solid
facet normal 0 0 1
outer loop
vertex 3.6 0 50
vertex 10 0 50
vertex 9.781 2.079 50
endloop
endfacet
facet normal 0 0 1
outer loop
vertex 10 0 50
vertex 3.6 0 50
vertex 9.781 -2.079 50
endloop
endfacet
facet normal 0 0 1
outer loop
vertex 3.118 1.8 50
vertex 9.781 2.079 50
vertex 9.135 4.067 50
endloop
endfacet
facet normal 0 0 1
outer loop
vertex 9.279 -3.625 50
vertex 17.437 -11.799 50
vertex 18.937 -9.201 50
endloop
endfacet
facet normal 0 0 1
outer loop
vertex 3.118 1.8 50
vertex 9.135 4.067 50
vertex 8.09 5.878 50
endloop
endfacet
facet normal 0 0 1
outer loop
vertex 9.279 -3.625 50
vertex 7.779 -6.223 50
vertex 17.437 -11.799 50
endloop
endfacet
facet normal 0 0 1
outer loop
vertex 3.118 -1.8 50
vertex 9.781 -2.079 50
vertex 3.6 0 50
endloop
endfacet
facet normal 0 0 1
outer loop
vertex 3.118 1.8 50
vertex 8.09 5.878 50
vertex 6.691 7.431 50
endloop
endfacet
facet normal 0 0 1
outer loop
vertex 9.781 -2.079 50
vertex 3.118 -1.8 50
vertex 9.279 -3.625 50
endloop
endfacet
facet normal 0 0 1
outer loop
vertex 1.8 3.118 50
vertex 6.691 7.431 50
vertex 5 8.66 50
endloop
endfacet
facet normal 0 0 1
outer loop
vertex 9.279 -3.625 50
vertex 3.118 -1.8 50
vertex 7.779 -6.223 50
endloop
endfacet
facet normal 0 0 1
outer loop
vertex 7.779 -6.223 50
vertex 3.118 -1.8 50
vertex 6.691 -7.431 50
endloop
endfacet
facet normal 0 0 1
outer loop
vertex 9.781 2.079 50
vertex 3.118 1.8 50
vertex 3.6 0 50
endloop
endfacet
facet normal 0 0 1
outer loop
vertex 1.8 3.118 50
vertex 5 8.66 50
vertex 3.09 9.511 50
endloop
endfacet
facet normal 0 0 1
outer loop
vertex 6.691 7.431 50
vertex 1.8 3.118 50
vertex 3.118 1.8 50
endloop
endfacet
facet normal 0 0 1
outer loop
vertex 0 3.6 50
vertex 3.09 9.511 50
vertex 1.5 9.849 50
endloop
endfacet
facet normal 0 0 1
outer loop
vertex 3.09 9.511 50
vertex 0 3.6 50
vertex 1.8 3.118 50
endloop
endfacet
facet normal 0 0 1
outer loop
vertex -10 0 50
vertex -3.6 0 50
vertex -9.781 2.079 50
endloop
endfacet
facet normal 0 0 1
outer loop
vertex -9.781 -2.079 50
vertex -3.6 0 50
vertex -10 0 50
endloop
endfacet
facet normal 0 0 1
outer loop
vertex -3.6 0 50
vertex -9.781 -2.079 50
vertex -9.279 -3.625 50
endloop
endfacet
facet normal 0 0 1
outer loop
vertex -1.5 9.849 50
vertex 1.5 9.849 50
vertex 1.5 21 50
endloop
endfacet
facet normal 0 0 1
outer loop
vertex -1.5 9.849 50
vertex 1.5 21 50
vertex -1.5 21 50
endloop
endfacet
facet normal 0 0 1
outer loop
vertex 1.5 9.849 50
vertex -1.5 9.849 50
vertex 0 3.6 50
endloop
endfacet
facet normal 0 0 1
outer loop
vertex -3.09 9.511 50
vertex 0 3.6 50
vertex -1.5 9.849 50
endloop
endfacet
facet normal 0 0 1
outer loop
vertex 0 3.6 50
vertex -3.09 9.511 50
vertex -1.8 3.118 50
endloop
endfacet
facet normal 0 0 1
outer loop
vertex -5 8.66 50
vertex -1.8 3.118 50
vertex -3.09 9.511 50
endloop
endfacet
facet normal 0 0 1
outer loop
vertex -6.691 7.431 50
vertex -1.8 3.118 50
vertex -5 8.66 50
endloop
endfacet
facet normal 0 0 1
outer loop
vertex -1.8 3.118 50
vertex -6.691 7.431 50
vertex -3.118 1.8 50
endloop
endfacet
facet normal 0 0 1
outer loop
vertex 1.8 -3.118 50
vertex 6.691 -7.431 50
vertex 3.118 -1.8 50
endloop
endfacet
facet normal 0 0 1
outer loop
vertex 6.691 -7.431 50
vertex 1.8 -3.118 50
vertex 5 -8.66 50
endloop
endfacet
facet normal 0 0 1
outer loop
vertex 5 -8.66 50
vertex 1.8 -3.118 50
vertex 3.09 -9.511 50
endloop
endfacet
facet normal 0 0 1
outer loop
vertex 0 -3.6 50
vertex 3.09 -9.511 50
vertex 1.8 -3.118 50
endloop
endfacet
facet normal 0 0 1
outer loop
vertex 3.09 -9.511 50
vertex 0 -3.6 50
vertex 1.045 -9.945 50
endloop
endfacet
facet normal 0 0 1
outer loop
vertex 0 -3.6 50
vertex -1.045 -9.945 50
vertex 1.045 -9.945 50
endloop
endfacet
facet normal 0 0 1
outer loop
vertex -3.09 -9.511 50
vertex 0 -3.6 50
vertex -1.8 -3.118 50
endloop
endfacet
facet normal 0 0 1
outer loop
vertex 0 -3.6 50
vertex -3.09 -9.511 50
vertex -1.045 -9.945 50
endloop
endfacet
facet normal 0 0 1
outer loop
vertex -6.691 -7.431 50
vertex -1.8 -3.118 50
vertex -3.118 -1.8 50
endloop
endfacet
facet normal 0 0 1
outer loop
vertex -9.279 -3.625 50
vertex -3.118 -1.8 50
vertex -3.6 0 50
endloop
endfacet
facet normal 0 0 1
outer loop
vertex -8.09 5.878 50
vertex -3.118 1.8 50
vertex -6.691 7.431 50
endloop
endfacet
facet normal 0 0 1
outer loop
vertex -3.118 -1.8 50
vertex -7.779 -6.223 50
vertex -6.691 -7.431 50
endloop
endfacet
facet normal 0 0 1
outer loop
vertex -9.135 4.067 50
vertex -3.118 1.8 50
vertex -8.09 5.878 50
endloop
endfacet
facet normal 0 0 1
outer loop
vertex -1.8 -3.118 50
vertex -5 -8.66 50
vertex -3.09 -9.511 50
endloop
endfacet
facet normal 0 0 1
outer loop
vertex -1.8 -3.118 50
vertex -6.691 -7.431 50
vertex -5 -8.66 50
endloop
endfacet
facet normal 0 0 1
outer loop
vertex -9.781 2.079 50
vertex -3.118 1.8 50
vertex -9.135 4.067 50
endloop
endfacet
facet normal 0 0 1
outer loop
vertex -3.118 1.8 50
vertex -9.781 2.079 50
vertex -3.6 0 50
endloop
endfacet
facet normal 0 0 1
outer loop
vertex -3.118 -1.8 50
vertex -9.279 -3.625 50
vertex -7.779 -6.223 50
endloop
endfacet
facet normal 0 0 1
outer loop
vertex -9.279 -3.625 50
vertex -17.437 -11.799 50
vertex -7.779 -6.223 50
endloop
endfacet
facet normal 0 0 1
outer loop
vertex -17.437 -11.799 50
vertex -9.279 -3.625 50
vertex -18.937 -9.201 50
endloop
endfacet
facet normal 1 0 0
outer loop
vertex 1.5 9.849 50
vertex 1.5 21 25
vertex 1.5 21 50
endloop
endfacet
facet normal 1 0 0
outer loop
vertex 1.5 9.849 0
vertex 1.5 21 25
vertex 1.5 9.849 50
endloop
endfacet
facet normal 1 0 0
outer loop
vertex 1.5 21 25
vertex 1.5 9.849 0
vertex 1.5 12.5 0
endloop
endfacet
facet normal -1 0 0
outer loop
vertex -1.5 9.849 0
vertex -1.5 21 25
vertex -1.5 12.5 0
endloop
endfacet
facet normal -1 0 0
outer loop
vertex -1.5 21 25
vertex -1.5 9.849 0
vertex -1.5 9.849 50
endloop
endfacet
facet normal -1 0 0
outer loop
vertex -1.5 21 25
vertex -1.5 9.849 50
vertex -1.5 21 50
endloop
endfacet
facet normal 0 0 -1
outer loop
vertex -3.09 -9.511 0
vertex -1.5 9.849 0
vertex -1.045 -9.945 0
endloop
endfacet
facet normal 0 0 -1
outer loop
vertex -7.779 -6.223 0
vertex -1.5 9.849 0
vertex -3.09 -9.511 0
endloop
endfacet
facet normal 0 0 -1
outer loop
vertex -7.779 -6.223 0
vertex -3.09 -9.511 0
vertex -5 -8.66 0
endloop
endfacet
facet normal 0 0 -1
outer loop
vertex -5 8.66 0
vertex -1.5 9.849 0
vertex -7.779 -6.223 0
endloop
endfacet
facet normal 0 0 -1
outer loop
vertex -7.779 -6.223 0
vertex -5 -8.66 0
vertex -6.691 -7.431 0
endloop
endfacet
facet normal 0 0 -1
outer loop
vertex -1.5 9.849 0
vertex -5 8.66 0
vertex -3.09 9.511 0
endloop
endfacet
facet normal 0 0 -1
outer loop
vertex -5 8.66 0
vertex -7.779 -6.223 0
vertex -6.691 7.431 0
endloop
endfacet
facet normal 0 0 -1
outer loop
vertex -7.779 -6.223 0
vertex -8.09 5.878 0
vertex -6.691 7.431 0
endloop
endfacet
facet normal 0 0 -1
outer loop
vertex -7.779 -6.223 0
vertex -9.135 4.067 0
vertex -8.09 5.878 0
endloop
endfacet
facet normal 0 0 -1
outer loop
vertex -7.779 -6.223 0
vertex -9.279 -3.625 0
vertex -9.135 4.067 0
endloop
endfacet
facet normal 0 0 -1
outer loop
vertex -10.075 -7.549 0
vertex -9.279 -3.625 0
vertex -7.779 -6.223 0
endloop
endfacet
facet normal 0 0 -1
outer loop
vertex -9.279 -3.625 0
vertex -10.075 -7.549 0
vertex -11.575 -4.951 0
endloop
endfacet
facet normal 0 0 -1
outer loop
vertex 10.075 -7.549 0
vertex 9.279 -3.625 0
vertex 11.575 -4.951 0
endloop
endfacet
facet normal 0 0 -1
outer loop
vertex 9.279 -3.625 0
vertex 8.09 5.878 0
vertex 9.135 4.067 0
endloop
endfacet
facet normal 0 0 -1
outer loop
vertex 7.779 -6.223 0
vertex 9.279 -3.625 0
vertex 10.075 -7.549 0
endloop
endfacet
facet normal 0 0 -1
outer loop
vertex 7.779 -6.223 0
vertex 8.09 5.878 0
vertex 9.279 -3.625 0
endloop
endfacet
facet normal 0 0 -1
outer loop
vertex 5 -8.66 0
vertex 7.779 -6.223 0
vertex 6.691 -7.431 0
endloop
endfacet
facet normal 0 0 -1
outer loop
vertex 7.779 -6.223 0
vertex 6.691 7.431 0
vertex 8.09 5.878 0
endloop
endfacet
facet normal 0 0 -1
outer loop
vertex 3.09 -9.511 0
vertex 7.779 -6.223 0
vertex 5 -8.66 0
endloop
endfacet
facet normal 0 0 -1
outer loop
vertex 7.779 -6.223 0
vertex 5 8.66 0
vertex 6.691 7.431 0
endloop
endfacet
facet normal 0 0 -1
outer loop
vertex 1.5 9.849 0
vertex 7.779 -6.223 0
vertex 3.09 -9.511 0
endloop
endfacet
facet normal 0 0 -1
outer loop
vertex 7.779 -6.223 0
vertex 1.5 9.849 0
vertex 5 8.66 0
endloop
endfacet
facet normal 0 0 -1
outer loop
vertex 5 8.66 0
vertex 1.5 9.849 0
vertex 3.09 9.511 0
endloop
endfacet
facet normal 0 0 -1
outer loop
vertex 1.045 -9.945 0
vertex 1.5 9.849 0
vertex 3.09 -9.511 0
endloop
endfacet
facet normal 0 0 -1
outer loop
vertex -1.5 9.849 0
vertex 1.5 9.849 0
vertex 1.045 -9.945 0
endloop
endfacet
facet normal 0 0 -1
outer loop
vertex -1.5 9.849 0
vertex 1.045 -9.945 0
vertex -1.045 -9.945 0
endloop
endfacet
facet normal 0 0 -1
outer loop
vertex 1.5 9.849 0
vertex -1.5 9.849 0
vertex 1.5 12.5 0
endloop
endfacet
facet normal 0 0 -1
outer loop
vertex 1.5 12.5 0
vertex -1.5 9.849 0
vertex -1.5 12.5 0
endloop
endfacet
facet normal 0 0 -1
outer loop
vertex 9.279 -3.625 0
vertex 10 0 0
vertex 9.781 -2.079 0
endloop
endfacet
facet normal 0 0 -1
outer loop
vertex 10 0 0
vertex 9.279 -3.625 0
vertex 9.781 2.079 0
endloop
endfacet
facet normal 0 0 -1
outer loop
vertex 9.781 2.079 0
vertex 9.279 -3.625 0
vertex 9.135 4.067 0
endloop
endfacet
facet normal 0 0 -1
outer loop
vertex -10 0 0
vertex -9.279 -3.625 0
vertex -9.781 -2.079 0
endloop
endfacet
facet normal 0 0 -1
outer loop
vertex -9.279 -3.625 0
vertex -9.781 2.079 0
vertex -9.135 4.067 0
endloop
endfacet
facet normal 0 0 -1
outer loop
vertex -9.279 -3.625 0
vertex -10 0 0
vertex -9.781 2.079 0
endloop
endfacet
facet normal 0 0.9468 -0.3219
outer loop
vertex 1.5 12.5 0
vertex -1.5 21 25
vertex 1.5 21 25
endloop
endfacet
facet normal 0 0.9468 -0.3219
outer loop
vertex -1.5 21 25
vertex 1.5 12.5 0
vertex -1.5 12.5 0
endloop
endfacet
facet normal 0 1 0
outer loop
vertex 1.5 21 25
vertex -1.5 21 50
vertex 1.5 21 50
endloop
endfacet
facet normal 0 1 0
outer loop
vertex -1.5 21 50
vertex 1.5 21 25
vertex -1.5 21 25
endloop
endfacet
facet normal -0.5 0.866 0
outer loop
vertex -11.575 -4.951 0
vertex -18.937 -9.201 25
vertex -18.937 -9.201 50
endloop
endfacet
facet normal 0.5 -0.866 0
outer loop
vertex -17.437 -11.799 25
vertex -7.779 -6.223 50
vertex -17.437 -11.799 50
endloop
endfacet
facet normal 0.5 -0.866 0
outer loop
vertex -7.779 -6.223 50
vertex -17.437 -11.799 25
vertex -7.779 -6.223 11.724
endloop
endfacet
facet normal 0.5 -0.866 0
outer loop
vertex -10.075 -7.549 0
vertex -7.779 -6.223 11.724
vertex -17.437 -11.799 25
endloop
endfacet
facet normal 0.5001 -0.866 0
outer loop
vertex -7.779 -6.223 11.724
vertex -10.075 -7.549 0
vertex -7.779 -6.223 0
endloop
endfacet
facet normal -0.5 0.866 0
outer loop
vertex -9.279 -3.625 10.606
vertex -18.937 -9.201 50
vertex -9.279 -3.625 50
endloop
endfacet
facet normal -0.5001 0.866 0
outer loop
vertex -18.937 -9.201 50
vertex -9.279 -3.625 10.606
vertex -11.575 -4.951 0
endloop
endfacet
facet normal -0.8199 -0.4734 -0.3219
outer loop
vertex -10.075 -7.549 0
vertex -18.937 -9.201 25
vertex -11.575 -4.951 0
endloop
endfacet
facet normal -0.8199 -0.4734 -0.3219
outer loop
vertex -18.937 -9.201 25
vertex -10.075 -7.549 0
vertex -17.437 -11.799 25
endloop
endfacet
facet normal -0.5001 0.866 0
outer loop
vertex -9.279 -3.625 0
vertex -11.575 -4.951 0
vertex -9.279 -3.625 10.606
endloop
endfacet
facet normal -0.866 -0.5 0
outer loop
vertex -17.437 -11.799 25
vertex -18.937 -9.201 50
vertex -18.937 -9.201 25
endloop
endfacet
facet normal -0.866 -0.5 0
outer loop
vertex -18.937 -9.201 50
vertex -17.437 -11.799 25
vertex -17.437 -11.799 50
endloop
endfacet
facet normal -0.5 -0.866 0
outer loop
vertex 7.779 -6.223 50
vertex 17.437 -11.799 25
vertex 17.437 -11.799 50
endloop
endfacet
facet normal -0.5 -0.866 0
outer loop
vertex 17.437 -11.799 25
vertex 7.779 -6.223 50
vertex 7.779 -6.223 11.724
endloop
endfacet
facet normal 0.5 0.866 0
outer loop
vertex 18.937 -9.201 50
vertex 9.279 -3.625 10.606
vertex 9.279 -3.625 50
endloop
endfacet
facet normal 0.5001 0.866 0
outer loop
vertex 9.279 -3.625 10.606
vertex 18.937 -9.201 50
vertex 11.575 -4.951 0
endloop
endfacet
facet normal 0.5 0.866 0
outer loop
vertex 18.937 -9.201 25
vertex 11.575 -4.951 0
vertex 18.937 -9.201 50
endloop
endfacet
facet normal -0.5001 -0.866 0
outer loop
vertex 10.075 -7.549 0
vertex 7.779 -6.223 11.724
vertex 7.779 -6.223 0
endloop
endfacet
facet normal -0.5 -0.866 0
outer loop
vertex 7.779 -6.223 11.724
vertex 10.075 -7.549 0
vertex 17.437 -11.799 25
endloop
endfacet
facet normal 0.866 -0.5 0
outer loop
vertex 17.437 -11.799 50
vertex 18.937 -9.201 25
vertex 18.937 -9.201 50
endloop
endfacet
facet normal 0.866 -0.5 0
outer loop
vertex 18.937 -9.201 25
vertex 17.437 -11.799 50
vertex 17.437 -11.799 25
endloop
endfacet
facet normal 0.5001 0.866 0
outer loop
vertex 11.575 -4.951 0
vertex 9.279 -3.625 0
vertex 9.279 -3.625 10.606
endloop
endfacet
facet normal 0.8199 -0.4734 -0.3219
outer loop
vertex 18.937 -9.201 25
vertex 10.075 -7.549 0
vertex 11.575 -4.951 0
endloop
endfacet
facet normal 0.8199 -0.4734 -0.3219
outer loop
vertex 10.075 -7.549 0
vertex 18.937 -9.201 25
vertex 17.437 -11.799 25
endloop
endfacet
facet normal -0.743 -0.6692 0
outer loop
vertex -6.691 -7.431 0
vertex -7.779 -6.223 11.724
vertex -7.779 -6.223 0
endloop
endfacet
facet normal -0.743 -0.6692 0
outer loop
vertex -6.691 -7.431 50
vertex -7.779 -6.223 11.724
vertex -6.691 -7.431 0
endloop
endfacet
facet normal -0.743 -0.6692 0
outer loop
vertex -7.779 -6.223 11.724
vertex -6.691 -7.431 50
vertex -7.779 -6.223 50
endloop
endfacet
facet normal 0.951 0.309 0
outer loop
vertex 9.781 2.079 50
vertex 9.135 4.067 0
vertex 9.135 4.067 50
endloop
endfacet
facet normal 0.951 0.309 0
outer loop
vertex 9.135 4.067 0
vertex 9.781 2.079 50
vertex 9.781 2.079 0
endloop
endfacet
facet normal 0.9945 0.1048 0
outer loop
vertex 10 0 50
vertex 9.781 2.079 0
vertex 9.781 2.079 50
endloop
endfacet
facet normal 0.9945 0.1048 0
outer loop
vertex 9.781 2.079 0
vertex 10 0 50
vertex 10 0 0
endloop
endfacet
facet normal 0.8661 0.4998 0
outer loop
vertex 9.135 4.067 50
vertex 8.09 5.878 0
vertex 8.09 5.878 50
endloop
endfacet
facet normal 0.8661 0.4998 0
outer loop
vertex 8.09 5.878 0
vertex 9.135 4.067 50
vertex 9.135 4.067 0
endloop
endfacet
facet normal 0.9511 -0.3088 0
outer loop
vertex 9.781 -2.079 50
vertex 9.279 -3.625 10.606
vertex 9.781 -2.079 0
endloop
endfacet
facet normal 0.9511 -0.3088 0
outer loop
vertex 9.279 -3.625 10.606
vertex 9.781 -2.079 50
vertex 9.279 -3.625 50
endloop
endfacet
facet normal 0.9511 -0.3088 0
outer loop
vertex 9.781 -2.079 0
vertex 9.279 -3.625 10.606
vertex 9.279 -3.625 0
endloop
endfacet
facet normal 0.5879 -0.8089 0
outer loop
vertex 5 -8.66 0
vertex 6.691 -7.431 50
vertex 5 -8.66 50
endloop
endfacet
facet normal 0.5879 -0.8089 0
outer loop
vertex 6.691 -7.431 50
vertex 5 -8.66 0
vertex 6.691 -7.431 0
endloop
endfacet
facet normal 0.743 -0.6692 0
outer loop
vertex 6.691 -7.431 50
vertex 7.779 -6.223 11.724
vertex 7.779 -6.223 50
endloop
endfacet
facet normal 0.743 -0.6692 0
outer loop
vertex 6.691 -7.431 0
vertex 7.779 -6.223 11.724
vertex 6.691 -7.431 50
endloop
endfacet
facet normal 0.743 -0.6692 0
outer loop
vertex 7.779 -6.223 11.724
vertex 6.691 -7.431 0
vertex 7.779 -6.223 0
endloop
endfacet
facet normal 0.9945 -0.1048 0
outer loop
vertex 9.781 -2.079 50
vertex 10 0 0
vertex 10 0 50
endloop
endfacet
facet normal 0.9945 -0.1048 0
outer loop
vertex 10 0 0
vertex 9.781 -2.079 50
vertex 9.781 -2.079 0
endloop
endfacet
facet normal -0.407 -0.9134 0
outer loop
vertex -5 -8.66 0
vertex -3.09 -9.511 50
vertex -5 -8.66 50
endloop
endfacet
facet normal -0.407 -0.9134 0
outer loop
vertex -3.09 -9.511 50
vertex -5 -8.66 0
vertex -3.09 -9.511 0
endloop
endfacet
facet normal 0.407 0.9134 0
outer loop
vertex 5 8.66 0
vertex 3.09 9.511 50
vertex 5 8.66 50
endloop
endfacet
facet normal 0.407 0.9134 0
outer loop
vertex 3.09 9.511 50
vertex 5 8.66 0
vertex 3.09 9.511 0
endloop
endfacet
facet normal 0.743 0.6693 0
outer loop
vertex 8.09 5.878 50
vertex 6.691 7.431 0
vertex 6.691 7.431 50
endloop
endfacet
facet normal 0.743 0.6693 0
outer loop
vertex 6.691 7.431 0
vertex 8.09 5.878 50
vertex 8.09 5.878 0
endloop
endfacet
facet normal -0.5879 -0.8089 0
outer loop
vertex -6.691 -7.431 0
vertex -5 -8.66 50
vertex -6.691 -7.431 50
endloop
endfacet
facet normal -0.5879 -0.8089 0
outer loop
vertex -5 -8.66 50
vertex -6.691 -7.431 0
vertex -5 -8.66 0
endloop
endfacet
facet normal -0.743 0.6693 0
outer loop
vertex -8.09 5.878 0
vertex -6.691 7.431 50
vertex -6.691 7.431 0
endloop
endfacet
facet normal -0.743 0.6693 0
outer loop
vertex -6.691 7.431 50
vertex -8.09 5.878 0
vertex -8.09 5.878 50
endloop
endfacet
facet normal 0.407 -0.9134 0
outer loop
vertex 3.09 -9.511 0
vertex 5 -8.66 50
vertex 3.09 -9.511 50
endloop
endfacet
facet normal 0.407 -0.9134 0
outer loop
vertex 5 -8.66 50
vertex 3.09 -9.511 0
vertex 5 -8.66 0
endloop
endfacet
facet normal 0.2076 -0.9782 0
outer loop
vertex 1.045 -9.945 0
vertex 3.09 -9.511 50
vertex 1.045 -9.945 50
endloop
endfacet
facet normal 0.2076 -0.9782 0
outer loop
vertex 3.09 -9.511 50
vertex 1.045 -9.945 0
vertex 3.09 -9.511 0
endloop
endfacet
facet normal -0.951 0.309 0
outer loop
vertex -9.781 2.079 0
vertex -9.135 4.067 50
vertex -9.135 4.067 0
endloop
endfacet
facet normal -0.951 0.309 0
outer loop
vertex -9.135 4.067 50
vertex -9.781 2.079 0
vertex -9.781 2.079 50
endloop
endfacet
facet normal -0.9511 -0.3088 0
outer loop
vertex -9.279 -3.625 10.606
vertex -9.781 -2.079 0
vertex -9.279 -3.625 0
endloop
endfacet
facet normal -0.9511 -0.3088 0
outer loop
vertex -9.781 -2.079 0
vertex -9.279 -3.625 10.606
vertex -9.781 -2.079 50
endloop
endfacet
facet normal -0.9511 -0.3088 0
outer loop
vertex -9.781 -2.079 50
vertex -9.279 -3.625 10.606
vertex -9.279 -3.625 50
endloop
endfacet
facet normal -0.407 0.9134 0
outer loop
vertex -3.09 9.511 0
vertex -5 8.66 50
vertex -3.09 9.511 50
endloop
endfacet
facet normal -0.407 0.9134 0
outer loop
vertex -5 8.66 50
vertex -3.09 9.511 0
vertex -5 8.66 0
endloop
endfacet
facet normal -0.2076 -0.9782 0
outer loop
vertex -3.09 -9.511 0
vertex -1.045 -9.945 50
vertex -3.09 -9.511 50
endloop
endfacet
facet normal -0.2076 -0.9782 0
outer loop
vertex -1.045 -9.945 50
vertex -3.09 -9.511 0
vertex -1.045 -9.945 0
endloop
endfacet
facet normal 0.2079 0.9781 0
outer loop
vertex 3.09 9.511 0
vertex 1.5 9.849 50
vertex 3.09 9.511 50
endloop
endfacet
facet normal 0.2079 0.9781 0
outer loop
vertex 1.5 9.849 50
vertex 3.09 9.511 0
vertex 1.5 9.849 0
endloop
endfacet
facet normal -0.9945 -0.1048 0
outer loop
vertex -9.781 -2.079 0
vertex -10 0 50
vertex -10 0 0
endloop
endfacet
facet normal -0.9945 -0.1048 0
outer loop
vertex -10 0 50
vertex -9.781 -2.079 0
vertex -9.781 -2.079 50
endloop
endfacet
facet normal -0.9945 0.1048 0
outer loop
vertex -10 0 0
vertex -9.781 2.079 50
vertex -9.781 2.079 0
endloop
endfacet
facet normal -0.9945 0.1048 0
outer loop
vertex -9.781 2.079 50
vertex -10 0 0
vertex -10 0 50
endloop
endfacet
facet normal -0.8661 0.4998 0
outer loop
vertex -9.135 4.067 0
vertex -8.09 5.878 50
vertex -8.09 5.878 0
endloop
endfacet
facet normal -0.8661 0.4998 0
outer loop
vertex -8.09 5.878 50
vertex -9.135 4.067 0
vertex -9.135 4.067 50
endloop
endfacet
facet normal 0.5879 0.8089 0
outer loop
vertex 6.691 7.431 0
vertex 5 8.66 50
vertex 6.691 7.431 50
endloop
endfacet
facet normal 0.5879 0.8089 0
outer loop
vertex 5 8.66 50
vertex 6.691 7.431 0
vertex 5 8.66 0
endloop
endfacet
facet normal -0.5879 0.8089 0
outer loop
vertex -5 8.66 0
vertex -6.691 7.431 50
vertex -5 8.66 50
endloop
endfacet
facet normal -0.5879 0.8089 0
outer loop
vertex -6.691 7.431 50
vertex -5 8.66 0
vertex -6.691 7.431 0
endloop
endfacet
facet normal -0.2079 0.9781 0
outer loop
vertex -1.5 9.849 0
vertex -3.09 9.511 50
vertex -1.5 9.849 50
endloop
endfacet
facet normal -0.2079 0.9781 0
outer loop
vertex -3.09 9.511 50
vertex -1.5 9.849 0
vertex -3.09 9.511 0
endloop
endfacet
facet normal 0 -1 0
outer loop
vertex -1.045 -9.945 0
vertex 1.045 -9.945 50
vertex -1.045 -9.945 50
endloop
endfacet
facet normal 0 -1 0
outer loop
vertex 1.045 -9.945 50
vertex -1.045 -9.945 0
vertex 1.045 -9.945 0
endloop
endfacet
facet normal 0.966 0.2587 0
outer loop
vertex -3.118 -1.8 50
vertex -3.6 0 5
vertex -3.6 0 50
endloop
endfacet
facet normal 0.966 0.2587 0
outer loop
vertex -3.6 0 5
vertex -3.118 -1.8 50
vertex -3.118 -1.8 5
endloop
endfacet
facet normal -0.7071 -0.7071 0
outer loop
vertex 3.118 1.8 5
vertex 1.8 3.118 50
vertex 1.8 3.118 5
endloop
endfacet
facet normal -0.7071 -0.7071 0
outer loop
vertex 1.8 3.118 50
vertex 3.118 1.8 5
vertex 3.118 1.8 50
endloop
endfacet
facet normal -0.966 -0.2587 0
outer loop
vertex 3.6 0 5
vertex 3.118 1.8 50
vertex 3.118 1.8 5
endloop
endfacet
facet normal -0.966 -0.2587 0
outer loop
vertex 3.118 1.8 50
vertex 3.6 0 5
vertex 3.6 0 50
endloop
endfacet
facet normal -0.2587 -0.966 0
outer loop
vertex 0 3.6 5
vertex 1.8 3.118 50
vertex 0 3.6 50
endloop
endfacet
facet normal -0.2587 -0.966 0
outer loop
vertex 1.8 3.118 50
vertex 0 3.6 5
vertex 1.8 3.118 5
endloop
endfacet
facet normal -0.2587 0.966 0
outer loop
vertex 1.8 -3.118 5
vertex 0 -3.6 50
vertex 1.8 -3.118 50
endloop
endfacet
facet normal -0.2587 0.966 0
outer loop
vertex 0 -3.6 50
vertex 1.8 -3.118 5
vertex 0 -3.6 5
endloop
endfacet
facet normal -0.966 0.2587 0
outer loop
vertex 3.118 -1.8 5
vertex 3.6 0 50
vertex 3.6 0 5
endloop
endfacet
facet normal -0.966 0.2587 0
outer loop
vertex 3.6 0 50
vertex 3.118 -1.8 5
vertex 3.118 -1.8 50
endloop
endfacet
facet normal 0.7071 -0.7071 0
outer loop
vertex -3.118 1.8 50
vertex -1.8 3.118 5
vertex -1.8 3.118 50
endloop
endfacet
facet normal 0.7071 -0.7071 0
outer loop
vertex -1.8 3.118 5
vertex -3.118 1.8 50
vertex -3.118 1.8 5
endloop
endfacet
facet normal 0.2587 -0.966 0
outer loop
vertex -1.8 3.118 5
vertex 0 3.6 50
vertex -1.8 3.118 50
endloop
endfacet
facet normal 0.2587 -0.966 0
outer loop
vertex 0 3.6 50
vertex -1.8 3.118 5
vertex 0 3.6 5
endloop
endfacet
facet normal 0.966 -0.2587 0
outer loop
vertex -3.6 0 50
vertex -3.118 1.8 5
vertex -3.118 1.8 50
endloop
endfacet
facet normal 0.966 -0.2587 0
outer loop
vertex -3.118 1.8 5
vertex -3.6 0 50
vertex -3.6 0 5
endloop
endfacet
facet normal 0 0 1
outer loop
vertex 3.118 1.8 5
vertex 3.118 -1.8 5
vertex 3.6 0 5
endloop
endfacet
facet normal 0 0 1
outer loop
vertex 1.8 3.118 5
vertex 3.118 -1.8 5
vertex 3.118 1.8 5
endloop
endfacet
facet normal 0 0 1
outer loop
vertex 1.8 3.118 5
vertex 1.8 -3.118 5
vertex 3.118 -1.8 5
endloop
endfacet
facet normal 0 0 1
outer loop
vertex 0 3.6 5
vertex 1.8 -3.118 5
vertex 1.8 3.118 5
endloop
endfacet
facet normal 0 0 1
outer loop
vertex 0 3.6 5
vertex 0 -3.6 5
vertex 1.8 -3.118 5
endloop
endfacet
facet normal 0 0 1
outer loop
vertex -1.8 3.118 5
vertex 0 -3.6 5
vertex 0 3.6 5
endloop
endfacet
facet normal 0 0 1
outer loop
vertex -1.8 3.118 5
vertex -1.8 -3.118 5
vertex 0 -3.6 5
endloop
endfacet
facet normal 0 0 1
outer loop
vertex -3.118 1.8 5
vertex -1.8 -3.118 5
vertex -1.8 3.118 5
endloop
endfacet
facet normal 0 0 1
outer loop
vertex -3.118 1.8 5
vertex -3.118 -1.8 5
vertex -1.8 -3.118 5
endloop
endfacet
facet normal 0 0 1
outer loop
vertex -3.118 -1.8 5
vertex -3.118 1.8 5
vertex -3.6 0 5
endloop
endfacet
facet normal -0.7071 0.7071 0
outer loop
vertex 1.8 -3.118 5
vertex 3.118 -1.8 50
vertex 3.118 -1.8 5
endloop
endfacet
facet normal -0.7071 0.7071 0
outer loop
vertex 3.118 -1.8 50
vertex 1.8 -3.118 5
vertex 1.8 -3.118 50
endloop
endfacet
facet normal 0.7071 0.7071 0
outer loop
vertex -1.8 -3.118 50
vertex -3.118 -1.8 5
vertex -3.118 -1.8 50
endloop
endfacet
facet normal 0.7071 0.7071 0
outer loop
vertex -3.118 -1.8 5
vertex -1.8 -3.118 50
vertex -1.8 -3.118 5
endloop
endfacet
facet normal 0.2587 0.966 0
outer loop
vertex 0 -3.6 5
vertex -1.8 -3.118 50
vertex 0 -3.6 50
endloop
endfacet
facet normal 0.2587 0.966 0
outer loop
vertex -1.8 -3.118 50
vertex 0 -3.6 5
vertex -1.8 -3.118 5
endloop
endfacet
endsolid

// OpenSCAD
//PlantPostLightningFix

rodDia=7.1;
innerPostDia=42;
lowerDia=25;
ripThck=3;
ovHght= 50;
fudge=0.1;

poly=[[0,0],[ovHght,0],[ovHght,innerPostDia/2],[ovHght/2,innerPostDia/2],[0,lowerDia/2]];


difference(){
  union(){
    cylinder(d=20,h=ovHght);
    for (i=[0,120,240])
      rotate([0,-90,i]) linear_extrude(ripThck,center=true) polygon(poly);
  }
  translate([0,0,5]) cylinder(d=rodDia+fudge,h=ovHght+fudge);
}

//rips



  
